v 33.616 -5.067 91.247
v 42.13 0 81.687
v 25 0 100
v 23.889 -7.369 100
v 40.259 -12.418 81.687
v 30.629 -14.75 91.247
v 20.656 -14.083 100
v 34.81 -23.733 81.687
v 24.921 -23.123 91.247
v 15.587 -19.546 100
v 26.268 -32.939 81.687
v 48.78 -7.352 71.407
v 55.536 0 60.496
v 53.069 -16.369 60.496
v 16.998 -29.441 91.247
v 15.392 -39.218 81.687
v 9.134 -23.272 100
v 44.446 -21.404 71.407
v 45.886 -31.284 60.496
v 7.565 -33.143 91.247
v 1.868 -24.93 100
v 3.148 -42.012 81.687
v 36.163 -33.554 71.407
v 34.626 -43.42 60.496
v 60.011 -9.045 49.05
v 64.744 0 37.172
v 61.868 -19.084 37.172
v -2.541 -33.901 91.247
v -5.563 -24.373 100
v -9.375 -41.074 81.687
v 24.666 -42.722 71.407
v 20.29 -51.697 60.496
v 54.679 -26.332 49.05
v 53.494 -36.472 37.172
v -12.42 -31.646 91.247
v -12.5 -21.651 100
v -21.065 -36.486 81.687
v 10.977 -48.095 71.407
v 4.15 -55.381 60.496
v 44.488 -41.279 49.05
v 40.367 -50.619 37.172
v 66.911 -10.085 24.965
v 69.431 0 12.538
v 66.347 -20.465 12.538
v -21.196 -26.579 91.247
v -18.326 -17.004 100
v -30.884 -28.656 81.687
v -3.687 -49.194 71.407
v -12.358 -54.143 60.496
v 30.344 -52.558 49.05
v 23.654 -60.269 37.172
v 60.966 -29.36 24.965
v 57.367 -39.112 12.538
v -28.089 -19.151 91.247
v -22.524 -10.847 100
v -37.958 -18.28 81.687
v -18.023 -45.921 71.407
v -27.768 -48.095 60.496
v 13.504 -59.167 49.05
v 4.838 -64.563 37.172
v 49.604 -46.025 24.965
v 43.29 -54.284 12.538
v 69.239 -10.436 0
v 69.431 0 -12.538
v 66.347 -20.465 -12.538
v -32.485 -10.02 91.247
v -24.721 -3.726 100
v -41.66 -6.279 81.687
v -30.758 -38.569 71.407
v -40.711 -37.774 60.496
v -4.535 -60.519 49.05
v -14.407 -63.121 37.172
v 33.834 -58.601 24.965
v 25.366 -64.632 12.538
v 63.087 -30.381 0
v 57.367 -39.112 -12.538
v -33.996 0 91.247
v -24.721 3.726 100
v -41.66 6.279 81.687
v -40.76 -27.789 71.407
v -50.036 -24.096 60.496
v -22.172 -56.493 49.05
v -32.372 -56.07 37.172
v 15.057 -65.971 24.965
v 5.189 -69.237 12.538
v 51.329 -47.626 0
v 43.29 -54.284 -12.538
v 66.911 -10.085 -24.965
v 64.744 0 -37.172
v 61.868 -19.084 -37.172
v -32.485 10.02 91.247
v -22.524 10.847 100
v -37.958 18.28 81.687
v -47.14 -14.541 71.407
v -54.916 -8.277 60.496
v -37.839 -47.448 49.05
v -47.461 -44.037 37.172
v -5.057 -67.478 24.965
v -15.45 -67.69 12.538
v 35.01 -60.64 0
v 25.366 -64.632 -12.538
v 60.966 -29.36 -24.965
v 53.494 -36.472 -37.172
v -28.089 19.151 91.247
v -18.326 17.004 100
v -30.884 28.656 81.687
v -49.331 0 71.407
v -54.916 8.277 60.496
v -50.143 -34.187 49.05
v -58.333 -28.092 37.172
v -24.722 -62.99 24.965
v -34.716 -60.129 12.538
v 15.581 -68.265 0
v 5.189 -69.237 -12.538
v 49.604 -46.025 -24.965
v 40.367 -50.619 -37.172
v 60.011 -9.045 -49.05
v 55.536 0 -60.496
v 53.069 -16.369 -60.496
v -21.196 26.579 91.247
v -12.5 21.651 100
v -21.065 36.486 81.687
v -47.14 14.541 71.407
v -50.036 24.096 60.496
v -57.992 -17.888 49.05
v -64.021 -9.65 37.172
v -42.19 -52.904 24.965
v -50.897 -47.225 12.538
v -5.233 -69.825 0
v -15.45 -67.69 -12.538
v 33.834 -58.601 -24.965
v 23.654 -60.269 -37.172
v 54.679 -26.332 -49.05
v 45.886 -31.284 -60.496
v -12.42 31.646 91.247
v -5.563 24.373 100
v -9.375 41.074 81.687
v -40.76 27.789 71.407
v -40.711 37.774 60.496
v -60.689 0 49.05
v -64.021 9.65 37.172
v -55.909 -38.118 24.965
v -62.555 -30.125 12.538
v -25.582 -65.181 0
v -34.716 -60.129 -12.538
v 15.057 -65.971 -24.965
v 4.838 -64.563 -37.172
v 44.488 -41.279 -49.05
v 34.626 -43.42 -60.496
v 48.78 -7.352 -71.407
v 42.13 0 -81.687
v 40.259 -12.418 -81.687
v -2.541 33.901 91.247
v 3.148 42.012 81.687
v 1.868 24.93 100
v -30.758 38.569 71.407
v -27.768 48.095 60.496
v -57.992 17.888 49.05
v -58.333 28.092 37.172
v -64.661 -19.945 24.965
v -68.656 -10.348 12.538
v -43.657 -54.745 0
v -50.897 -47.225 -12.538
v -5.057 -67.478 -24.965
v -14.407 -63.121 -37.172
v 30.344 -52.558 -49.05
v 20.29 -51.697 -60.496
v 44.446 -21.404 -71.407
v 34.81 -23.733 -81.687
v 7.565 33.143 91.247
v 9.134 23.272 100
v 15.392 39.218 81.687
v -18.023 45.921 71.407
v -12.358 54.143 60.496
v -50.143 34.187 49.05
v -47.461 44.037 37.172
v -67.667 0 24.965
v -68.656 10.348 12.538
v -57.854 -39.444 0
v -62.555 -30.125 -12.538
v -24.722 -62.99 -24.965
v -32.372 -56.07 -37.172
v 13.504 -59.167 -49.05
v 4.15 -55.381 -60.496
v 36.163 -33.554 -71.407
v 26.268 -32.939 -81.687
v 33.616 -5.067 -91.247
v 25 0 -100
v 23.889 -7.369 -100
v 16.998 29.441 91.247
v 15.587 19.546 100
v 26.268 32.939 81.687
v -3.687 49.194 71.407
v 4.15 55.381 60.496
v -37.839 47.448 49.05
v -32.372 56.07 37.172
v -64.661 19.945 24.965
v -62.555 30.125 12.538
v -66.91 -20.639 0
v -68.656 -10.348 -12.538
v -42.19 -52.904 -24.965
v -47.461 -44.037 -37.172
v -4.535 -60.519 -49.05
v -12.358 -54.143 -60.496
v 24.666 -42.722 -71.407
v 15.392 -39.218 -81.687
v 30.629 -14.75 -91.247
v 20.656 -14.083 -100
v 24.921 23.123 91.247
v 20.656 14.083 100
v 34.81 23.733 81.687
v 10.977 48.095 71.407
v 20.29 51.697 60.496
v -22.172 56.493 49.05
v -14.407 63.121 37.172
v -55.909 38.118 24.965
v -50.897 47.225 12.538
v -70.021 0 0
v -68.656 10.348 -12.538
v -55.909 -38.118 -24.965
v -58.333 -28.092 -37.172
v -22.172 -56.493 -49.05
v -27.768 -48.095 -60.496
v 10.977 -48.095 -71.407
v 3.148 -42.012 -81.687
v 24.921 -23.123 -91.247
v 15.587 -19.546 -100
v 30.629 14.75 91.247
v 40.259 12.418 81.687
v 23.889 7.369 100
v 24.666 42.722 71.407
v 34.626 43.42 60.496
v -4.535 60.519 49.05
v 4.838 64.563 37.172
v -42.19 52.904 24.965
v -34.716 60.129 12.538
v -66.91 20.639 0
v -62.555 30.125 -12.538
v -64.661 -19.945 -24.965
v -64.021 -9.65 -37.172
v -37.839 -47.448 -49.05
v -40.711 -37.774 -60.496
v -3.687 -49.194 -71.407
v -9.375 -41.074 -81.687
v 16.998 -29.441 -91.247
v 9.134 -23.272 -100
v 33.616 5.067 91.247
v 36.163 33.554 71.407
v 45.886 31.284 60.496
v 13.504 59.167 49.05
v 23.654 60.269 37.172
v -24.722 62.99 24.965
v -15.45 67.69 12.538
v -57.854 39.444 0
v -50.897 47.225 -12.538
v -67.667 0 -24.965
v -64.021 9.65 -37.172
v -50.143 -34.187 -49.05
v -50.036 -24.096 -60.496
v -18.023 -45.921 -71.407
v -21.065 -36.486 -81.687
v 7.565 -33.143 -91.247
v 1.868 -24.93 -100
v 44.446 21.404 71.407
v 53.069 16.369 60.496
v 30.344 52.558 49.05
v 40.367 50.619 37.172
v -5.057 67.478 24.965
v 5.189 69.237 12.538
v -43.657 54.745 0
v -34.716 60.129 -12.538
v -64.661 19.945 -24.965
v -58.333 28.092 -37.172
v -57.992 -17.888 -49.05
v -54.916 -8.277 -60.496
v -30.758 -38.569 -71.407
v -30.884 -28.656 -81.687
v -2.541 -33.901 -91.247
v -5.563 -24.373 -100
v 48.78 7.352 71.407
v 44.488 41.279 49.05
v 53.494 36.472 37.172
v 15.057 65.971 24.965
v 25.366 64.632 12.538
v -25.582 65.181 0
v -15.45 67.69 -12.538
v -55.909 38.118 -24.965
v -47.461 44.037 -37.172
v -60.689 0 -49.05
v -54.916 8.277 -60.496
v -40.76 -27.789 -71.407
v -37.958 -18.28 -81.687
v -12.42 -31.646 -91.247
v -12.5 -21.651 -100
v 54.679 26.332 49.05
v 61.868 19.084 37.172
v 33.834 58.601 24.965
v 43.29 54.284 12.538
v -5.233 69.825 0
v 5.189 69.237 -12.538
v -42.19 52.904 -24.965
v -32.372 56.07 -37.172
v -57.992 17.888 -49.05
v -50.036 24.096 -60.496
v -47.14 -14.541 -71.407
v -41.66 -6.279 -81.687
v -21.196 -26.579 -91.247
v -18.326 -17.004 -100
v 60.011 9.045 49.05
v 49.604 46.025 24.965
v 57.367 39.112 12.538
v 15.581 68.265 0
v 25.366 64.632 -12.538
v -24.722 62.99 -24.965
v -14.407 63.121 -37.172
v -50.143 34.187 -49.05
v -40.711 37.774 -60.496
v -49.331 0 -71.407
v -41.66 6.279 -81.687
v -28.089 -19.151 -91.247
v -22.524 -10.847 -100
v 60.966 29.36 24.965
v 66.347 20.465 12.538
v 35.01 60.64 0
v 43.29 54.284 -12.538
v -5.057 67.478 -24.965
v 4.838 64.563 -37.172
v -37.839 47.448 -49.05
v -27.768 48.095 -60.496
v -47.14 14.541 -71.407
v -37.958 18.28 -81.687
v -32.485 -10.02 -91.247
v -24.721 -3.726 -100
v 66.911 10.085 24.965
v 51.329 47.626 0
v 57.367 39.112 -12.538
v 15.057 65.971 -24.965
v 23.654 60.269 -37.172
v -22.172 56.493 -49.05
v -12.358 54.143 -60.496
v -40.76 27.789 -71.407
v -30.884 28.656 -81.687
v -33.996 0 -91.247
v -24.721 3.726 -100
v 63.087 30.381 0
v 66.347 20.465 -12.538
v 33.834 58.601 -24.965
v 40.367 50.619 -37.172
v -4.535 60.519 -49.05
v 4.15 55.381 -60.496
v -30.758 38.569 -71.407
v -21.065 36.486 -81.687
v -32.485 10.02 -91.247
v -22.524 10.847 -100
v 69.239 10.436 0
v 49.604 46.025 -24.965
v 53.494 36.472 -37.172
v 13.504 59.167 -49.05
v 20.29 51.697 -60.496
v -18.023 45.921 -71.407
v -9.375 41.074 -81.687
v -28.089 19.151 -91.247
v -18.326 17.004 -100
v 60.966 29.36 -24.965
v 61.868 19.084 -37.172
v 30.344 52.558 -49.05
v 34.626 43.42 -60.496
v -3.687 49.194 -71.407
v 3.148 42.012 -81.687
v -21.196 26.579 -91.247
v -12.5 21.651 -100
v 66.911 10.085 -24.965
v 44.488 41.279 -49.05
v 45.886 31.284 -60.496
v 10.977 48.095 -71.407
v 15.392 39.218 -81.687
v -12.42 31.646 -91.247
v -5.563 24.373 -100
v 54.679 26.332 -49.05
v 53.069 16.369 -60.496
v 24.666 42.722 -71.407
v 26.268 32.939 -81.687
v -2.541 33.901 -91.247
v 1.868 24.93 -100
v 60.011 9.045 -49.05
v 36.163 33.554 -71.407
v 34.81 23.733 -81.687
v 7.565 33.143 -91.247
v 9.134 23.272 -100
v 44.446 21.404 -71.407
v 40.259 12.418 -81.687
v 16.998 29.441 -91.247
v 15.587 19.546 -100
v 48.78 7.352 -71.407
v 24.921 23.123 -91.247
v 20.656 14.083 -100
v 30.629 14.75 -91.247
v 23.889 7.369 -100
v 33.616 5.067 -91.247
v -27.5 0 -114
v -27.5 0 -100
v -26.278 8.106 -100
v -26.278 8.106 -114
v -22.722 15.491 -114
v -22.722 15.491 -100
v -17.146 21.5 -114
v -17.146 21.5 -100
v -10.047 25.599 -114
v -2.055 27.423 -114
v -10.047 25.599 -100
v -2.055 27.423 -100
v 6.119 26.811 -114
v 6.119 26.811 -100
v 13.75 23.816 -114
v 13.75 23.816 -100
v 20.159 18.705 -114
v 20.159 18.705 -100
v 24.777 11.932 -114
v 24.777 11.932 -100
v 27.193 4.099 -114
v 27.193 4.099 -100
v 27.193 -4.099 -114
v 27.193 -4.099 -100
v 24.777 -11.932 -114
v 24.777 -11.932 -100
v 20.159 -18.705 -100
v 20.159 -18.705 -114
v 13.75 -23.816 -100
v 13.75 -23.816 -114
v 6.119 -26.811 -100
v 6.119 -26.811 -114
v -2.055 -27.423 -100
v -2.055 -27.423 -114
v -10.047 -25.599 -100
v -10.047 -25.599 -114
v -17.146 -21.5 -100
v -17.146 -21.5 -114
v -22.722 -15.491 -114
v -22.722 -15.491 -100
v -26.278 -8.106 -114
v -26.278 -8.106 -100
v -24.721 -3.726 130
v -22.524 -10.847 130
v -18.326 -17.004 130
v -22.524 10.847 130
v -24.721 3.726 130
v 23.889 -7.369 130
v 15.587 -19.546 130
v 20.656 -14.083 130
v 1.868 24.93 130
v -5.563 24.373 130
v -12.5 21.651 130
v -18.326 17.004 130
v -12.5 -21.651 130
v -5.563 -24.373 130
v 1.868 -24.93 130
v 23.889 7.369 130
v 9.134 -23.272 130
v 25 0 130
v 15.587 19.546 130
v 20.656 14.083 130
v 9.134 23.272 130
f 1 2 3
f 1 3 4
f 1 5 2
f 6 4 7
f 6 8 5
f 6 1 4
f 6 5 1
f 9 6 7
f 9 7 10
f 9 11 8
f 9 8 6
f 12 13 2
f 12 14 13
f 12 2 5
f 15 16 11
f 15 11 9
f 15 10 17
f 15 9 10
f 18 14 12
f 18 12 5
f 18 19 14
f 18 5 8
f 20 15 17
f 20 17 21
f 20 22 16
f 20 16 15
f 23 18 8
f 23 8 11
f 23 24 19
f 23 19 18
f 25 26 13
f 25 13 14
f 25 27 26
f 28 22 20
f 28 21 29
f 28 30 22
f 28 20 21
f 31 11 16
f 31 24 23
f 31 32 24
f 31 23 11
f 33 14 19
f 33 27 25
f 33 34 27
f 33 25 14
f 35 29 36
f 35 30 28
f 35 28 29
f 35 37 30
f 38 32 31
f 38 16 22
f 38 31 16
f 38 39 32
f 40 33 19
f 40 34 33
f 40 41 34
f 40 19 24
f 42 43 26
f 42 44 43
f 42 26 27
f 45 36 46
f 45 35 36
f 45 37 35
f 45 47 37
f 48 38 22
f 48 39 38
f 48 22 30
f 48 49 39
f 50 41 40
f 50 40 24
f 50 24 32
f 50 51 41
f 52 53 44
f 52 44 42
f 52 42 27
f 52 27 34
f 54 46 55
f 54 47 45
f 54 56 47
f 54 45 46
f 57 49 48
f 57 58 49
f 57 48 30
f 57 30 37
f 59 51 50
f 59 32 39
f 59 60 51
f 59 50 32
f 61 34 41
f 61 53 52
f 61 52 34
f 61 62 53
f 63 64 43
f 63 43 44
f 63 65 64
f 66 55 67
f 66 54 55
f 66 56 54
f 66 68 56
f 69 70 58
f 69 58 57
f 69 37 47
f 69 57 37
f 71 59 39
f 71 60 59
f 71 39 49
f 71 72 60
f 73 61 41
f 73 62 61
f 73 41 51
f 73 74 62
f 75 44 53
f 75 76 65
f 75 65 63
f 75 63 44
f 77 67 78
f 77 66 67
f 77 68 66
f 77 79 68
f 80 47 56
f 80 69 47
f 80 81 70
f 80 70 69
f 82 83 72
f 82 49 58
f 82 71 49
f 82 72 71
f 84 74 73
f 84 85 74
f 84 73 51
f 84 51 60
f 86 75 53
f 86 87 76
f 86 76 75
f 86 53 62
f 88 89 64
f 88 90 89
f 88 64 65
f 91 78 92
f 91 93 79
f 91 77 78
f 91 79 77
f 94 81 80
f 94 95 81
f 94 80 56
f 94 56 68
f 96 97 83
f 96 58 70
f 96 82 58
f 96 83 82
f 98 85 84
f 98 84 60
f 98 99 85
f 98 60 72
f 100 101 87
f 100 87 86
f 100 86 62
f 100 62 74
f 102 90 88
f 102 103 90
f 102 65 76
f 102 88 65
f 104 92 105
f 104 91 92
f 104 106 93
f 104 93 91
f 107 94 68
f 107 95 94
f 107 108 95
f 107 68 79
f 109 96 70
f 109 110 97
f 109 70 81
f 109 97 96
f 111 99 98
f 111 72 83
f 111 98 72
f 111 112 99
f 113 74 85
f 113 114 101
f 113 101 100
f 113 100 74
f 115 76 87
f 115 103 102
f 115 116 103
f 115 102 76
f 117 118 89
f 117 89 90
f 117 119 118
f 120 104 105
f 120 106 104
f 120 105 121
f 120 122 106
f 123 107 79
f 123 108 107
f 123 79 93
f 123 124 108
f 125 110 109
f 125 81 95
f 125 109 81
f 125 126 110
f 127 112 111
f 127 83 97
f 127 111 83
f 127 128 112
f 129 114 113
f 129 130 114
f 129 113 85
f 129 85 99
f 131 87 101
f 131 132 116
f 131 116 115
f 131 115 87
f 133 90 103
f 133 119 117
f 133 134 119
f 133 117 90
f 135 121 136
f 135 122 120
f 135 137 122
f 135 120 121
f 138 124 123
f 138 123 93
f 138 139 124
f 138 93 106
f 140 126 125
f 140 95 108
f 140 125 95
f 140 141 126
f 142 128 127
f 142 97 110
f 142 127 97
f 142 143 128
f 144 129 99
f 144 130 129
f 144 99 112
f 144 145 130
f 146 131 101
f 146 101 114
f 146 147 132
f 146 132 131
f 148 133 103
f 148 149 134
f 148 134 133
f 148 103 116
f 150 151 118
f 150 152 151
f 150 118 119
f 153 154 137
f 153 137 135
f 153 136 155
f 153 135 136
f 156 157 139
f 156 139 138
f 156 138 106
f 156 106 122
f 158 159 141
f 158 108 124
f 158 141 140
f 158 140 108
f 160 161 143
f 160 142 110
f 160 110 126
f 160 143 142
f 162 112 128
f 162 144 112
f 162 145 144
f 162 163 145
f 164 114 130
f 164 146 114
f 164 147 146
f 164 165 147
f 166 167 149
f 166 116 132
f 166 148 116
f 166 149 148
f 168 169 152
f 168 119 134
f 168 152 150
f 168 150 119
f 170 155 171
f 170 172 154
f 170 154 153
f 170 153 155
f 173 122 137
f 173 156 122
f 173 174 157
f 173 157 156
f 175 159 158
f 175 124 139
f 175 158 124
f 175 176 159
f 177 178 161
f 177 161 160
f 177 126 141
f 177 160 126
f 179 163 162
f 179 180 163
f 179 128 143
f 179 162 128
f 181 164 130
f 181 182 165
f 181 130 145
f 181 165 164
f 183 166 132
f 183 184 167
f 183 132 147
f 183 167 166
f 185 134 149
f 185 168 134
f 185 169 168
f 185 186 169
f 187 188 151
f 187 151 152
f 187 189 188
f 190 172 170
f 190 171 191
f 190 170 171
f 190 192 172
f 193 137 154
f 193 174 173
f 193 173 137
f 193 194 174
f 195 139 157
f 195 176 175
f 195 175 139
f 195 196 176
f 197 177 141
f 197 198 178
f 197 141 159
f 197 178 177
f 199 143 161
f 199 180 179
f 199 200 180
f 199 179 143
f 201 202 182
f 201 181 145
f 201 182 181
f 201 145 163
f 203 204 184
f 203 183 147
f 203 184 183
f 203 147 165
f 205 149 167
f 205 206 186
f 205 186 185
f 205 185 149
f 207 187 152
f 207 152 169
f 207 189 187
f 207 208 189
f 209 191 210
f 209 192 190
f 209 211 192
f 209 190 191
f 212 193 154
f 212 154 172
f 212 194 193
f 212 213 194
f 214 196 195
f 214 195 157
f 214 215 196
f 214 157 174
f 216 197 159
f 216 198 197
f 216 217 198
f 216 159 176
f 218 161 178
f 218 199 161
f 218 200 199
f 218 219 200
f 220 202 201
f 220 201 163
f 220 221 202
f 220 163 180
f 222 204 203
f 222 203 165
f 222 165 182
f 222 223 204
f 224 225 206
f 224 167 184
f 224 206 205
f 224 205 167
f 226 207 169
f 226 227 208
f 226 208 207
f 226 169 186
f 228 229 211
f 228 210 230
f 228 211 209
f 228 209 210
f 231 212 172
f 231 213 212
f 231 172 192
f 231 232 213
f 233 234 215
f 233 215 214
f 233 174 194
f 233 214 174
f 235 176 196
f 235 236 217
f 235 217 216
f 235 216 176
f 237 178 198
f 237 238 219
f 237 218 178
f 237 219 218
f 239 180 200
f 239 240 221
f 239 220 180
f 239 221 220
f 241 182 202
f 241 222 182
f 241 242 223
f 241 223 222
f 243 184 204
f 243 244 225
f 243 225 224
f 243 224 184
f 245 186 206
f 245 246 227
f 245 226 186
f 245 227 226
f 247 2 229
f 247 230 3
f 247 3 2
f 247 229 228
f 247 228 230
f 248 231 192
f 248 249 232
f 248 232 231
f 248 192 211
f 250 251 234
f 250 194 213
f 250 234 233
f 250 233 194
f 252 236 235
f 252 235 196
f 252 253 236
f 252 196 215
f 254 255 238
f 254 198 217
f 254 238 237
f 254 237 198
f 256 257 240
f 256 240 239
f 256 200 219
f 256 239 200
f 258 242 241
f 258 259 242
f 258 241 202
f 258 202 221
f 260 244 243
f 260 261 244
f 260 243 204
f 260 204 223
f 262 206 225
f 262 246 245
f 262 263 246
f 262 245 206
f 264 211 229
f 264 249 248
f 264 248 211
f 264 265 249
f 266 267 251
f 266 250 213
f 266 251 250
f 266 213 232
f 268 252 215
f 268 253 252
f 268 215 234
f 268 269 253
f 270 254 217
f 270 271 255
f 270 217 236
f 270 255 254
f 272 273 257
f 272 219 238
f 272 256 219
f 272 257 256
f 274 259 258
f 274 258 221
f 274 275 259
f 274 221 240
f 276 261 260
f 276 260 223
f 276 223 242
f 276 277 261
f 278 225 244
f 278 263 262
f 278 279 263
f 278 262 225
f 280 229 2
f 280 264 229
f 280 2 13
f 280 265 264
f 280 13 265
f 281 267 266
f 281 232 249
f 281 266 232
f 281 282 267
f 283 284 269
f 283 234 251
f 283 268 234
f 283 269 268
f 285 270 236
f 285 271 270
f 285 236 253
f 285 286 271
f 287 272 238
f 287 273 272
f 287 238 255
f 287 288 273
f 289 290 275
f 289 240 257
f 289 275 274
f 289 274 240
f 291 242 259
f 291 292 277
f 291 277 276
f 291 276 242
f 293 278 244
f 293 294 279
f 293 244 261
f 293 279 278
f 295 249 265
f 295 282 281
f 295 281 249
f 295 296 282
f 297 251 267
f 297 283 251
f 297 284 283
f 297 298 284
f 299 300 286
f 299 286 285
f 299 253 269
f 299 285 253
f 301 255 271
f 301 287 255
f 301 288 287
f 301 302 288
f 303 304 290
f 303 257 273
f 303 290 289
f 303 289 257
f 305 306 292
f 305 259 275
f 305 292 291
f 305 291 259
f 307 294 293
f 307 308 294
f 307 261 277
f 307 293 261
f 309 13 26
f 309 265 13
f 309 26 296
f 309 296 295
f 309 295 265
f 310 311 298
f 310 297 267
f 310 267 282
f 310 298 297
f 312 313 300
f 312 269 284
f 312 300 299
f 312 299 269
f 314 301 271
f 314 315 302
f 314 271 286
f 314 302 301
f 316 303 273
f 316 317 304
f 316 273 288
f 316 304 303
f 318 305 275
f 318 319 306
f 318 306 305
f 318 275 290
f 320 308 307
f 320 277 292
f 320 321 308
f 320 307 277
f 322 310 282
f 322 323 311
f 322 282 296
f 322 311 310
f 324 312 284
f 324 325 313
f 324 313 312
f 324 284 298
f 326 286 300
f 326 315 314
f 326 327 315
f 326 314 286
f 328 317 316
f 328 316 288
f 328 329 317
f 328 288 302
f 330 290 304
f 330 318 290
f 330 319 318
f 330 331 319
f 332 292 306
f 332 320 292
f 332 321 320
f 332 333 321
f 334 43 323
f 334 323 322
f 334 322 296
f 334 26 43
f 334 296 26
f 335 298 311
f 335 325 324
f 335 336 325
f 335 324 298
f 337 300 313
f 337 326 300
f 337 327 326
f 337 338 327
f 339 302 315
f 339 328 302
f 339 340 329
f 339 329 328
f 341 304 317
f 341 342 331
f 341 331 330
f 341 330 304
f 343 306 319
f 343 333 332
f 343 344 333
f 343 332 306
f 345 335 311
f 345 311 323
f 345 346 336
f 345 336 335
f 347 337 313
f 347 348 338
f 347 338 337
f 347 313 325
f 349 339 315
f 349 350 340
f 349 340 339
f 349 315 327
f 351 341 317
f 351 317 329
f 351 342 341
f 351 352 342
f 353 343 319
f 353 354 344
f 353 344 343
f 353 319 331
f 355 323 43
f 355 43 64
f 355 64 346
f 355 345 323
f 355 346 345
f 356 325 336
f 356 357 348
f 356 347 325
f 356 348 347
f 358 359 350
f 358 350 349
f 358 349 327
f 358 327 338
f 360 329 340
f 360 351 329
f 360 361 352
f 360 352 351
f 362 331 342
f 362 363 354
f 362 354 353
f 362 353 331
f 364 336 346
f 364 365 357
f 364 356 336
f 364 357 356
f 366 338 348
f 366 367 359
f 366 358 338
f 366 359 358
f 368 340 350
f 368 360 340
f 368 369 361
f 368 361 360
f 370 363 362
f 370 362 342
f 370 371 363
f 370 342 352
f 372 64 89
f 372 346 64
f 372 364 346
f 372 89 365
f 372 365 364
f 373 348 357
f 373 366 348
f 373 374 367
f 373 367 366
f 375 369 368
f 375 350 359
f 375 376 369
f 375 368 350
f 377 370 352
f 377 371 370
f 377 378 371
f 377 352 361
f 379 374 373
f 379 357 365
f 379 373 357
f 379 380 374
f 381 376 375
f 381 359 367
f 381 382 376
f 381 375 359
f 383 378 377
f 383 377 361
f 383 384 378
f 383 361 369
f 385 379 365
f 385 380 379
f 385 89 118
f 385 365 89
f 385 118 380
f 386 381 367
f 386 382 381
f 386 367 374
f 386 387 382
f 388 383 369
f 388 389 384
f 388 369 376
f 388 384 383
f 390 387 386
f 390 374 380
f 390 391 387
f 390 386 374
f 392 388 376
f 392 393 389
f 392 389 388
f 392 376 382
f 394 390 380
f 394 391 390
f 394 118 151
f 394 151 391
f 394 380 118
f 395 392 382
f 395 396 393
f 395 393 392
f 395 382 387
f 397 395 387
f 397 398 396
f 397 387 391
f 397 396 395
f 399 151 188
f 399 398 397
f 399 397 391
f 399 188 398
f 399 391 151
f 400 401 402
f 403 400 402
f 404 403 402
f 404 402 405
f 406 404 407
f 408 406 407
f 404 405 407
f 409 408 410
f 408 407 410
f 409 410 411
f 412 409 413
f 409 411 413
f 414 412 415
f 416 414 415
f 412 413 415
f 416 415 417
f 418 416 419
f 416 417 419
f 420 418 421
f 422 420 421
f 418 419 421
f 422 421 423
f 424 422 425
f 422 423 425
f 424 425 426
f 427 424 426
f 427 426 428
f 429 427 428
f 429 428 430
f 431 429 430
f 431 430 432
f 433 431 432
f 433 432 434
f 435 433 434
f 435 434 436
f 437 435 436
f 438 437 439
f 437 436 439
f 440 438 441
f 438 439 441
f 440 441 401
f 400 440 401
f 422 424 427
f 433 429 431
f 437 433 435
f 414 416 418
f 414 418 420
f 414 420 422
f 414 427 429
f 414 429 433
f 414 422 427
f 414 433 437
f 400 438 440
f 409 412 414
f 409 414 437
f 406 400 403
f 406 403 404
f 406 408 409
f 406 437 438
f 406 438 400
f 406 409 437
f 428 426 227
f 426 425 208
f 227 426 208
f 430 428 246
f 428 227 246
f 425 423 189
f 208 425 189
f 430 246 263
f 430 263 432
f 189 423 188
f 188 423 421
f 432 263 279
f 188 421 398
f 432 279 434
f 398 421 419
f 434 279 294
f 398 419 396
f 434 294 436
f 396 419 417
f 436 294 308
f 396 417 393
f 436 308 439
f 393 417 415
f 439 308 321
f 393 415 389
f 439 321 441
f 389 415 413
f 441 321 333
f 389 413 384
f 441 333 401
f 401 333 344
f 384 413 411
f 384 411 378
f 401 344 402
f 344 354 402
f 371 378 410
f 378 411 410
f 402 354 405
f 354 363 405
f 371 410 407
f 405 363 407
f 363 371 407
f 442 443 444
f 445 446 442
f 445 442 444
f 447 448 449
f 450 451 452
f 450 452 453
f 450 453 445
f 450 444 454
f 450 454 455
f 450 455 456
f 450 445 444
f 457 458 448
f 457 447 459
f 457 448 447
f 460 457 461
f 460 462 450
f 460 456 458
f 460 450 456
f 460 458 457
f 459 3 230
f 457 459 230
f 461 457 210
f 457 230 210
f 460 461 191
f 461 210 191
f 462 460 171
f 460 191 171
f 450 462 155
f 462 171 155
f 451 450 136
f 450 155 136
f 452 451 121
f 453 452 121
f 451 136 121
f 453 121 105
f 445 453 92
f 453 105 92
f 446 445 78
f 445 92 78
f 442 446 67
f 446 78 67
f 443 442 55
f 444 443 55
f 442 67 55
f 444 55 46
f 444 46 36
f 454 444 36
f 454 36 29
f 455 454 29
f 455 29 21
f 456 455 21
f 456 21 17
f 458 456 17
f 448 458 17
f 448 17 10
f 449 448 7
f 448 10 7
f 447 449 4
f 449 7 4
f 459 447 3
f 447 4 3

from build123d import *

# Parameters (mm, degrees)
SKETCH2_R           = 25
BOSS_EXTRUDE1_DEPTH = 30
SKETCH3_R           = 27.5
BOSS_EXTRUDE2_DEPTH = 14


with BuildPart() as part:
    # Sketch1 → Revolve1 (revolve)
    with BuildSketch(Plane(origin=(0, 0, 0), x_dir=(0, 0, -1), z_dir=(1, 0, 0)), mode=Mode.PRIVATE) as revolve1_sk:
        with BuildLine():
            Line((-100, 0), (-100, 25))
            ThreePointArc((-100, 25), (0, 70.020961978), (100, 25))
            Line((100, 25), (100, 0))
            Line((100, 0), (-100, 0))
        make_face()
    revolve(revolve1_sk.sketch.rotate(Axis((0, 0, 74.117927805), (0, 0, -1)), 90), axis=Axis((0, 0, 74.117927805), (0, 0, -1)))

    # Sketch2 → Boss-Extrude1 (add)
    with BuildSketch(Plane.XY.offset(100)):
        Circle(SKETCH2_R)
    extrude(amount=BOSS_EXTRUDE1_DEPTH)

    # Sketch3 → Boss-Extrude2 (add)
    with BuildSketch(Plane(origin=(0, 0, -100), x_dir=(-1, 0, 0), z_dir=(0, 0, -1))):
        Circle(SKETCH3_R)
    extrude(amount=BOSS_EXTRUDE2_DEPTH)


solid = part.part
